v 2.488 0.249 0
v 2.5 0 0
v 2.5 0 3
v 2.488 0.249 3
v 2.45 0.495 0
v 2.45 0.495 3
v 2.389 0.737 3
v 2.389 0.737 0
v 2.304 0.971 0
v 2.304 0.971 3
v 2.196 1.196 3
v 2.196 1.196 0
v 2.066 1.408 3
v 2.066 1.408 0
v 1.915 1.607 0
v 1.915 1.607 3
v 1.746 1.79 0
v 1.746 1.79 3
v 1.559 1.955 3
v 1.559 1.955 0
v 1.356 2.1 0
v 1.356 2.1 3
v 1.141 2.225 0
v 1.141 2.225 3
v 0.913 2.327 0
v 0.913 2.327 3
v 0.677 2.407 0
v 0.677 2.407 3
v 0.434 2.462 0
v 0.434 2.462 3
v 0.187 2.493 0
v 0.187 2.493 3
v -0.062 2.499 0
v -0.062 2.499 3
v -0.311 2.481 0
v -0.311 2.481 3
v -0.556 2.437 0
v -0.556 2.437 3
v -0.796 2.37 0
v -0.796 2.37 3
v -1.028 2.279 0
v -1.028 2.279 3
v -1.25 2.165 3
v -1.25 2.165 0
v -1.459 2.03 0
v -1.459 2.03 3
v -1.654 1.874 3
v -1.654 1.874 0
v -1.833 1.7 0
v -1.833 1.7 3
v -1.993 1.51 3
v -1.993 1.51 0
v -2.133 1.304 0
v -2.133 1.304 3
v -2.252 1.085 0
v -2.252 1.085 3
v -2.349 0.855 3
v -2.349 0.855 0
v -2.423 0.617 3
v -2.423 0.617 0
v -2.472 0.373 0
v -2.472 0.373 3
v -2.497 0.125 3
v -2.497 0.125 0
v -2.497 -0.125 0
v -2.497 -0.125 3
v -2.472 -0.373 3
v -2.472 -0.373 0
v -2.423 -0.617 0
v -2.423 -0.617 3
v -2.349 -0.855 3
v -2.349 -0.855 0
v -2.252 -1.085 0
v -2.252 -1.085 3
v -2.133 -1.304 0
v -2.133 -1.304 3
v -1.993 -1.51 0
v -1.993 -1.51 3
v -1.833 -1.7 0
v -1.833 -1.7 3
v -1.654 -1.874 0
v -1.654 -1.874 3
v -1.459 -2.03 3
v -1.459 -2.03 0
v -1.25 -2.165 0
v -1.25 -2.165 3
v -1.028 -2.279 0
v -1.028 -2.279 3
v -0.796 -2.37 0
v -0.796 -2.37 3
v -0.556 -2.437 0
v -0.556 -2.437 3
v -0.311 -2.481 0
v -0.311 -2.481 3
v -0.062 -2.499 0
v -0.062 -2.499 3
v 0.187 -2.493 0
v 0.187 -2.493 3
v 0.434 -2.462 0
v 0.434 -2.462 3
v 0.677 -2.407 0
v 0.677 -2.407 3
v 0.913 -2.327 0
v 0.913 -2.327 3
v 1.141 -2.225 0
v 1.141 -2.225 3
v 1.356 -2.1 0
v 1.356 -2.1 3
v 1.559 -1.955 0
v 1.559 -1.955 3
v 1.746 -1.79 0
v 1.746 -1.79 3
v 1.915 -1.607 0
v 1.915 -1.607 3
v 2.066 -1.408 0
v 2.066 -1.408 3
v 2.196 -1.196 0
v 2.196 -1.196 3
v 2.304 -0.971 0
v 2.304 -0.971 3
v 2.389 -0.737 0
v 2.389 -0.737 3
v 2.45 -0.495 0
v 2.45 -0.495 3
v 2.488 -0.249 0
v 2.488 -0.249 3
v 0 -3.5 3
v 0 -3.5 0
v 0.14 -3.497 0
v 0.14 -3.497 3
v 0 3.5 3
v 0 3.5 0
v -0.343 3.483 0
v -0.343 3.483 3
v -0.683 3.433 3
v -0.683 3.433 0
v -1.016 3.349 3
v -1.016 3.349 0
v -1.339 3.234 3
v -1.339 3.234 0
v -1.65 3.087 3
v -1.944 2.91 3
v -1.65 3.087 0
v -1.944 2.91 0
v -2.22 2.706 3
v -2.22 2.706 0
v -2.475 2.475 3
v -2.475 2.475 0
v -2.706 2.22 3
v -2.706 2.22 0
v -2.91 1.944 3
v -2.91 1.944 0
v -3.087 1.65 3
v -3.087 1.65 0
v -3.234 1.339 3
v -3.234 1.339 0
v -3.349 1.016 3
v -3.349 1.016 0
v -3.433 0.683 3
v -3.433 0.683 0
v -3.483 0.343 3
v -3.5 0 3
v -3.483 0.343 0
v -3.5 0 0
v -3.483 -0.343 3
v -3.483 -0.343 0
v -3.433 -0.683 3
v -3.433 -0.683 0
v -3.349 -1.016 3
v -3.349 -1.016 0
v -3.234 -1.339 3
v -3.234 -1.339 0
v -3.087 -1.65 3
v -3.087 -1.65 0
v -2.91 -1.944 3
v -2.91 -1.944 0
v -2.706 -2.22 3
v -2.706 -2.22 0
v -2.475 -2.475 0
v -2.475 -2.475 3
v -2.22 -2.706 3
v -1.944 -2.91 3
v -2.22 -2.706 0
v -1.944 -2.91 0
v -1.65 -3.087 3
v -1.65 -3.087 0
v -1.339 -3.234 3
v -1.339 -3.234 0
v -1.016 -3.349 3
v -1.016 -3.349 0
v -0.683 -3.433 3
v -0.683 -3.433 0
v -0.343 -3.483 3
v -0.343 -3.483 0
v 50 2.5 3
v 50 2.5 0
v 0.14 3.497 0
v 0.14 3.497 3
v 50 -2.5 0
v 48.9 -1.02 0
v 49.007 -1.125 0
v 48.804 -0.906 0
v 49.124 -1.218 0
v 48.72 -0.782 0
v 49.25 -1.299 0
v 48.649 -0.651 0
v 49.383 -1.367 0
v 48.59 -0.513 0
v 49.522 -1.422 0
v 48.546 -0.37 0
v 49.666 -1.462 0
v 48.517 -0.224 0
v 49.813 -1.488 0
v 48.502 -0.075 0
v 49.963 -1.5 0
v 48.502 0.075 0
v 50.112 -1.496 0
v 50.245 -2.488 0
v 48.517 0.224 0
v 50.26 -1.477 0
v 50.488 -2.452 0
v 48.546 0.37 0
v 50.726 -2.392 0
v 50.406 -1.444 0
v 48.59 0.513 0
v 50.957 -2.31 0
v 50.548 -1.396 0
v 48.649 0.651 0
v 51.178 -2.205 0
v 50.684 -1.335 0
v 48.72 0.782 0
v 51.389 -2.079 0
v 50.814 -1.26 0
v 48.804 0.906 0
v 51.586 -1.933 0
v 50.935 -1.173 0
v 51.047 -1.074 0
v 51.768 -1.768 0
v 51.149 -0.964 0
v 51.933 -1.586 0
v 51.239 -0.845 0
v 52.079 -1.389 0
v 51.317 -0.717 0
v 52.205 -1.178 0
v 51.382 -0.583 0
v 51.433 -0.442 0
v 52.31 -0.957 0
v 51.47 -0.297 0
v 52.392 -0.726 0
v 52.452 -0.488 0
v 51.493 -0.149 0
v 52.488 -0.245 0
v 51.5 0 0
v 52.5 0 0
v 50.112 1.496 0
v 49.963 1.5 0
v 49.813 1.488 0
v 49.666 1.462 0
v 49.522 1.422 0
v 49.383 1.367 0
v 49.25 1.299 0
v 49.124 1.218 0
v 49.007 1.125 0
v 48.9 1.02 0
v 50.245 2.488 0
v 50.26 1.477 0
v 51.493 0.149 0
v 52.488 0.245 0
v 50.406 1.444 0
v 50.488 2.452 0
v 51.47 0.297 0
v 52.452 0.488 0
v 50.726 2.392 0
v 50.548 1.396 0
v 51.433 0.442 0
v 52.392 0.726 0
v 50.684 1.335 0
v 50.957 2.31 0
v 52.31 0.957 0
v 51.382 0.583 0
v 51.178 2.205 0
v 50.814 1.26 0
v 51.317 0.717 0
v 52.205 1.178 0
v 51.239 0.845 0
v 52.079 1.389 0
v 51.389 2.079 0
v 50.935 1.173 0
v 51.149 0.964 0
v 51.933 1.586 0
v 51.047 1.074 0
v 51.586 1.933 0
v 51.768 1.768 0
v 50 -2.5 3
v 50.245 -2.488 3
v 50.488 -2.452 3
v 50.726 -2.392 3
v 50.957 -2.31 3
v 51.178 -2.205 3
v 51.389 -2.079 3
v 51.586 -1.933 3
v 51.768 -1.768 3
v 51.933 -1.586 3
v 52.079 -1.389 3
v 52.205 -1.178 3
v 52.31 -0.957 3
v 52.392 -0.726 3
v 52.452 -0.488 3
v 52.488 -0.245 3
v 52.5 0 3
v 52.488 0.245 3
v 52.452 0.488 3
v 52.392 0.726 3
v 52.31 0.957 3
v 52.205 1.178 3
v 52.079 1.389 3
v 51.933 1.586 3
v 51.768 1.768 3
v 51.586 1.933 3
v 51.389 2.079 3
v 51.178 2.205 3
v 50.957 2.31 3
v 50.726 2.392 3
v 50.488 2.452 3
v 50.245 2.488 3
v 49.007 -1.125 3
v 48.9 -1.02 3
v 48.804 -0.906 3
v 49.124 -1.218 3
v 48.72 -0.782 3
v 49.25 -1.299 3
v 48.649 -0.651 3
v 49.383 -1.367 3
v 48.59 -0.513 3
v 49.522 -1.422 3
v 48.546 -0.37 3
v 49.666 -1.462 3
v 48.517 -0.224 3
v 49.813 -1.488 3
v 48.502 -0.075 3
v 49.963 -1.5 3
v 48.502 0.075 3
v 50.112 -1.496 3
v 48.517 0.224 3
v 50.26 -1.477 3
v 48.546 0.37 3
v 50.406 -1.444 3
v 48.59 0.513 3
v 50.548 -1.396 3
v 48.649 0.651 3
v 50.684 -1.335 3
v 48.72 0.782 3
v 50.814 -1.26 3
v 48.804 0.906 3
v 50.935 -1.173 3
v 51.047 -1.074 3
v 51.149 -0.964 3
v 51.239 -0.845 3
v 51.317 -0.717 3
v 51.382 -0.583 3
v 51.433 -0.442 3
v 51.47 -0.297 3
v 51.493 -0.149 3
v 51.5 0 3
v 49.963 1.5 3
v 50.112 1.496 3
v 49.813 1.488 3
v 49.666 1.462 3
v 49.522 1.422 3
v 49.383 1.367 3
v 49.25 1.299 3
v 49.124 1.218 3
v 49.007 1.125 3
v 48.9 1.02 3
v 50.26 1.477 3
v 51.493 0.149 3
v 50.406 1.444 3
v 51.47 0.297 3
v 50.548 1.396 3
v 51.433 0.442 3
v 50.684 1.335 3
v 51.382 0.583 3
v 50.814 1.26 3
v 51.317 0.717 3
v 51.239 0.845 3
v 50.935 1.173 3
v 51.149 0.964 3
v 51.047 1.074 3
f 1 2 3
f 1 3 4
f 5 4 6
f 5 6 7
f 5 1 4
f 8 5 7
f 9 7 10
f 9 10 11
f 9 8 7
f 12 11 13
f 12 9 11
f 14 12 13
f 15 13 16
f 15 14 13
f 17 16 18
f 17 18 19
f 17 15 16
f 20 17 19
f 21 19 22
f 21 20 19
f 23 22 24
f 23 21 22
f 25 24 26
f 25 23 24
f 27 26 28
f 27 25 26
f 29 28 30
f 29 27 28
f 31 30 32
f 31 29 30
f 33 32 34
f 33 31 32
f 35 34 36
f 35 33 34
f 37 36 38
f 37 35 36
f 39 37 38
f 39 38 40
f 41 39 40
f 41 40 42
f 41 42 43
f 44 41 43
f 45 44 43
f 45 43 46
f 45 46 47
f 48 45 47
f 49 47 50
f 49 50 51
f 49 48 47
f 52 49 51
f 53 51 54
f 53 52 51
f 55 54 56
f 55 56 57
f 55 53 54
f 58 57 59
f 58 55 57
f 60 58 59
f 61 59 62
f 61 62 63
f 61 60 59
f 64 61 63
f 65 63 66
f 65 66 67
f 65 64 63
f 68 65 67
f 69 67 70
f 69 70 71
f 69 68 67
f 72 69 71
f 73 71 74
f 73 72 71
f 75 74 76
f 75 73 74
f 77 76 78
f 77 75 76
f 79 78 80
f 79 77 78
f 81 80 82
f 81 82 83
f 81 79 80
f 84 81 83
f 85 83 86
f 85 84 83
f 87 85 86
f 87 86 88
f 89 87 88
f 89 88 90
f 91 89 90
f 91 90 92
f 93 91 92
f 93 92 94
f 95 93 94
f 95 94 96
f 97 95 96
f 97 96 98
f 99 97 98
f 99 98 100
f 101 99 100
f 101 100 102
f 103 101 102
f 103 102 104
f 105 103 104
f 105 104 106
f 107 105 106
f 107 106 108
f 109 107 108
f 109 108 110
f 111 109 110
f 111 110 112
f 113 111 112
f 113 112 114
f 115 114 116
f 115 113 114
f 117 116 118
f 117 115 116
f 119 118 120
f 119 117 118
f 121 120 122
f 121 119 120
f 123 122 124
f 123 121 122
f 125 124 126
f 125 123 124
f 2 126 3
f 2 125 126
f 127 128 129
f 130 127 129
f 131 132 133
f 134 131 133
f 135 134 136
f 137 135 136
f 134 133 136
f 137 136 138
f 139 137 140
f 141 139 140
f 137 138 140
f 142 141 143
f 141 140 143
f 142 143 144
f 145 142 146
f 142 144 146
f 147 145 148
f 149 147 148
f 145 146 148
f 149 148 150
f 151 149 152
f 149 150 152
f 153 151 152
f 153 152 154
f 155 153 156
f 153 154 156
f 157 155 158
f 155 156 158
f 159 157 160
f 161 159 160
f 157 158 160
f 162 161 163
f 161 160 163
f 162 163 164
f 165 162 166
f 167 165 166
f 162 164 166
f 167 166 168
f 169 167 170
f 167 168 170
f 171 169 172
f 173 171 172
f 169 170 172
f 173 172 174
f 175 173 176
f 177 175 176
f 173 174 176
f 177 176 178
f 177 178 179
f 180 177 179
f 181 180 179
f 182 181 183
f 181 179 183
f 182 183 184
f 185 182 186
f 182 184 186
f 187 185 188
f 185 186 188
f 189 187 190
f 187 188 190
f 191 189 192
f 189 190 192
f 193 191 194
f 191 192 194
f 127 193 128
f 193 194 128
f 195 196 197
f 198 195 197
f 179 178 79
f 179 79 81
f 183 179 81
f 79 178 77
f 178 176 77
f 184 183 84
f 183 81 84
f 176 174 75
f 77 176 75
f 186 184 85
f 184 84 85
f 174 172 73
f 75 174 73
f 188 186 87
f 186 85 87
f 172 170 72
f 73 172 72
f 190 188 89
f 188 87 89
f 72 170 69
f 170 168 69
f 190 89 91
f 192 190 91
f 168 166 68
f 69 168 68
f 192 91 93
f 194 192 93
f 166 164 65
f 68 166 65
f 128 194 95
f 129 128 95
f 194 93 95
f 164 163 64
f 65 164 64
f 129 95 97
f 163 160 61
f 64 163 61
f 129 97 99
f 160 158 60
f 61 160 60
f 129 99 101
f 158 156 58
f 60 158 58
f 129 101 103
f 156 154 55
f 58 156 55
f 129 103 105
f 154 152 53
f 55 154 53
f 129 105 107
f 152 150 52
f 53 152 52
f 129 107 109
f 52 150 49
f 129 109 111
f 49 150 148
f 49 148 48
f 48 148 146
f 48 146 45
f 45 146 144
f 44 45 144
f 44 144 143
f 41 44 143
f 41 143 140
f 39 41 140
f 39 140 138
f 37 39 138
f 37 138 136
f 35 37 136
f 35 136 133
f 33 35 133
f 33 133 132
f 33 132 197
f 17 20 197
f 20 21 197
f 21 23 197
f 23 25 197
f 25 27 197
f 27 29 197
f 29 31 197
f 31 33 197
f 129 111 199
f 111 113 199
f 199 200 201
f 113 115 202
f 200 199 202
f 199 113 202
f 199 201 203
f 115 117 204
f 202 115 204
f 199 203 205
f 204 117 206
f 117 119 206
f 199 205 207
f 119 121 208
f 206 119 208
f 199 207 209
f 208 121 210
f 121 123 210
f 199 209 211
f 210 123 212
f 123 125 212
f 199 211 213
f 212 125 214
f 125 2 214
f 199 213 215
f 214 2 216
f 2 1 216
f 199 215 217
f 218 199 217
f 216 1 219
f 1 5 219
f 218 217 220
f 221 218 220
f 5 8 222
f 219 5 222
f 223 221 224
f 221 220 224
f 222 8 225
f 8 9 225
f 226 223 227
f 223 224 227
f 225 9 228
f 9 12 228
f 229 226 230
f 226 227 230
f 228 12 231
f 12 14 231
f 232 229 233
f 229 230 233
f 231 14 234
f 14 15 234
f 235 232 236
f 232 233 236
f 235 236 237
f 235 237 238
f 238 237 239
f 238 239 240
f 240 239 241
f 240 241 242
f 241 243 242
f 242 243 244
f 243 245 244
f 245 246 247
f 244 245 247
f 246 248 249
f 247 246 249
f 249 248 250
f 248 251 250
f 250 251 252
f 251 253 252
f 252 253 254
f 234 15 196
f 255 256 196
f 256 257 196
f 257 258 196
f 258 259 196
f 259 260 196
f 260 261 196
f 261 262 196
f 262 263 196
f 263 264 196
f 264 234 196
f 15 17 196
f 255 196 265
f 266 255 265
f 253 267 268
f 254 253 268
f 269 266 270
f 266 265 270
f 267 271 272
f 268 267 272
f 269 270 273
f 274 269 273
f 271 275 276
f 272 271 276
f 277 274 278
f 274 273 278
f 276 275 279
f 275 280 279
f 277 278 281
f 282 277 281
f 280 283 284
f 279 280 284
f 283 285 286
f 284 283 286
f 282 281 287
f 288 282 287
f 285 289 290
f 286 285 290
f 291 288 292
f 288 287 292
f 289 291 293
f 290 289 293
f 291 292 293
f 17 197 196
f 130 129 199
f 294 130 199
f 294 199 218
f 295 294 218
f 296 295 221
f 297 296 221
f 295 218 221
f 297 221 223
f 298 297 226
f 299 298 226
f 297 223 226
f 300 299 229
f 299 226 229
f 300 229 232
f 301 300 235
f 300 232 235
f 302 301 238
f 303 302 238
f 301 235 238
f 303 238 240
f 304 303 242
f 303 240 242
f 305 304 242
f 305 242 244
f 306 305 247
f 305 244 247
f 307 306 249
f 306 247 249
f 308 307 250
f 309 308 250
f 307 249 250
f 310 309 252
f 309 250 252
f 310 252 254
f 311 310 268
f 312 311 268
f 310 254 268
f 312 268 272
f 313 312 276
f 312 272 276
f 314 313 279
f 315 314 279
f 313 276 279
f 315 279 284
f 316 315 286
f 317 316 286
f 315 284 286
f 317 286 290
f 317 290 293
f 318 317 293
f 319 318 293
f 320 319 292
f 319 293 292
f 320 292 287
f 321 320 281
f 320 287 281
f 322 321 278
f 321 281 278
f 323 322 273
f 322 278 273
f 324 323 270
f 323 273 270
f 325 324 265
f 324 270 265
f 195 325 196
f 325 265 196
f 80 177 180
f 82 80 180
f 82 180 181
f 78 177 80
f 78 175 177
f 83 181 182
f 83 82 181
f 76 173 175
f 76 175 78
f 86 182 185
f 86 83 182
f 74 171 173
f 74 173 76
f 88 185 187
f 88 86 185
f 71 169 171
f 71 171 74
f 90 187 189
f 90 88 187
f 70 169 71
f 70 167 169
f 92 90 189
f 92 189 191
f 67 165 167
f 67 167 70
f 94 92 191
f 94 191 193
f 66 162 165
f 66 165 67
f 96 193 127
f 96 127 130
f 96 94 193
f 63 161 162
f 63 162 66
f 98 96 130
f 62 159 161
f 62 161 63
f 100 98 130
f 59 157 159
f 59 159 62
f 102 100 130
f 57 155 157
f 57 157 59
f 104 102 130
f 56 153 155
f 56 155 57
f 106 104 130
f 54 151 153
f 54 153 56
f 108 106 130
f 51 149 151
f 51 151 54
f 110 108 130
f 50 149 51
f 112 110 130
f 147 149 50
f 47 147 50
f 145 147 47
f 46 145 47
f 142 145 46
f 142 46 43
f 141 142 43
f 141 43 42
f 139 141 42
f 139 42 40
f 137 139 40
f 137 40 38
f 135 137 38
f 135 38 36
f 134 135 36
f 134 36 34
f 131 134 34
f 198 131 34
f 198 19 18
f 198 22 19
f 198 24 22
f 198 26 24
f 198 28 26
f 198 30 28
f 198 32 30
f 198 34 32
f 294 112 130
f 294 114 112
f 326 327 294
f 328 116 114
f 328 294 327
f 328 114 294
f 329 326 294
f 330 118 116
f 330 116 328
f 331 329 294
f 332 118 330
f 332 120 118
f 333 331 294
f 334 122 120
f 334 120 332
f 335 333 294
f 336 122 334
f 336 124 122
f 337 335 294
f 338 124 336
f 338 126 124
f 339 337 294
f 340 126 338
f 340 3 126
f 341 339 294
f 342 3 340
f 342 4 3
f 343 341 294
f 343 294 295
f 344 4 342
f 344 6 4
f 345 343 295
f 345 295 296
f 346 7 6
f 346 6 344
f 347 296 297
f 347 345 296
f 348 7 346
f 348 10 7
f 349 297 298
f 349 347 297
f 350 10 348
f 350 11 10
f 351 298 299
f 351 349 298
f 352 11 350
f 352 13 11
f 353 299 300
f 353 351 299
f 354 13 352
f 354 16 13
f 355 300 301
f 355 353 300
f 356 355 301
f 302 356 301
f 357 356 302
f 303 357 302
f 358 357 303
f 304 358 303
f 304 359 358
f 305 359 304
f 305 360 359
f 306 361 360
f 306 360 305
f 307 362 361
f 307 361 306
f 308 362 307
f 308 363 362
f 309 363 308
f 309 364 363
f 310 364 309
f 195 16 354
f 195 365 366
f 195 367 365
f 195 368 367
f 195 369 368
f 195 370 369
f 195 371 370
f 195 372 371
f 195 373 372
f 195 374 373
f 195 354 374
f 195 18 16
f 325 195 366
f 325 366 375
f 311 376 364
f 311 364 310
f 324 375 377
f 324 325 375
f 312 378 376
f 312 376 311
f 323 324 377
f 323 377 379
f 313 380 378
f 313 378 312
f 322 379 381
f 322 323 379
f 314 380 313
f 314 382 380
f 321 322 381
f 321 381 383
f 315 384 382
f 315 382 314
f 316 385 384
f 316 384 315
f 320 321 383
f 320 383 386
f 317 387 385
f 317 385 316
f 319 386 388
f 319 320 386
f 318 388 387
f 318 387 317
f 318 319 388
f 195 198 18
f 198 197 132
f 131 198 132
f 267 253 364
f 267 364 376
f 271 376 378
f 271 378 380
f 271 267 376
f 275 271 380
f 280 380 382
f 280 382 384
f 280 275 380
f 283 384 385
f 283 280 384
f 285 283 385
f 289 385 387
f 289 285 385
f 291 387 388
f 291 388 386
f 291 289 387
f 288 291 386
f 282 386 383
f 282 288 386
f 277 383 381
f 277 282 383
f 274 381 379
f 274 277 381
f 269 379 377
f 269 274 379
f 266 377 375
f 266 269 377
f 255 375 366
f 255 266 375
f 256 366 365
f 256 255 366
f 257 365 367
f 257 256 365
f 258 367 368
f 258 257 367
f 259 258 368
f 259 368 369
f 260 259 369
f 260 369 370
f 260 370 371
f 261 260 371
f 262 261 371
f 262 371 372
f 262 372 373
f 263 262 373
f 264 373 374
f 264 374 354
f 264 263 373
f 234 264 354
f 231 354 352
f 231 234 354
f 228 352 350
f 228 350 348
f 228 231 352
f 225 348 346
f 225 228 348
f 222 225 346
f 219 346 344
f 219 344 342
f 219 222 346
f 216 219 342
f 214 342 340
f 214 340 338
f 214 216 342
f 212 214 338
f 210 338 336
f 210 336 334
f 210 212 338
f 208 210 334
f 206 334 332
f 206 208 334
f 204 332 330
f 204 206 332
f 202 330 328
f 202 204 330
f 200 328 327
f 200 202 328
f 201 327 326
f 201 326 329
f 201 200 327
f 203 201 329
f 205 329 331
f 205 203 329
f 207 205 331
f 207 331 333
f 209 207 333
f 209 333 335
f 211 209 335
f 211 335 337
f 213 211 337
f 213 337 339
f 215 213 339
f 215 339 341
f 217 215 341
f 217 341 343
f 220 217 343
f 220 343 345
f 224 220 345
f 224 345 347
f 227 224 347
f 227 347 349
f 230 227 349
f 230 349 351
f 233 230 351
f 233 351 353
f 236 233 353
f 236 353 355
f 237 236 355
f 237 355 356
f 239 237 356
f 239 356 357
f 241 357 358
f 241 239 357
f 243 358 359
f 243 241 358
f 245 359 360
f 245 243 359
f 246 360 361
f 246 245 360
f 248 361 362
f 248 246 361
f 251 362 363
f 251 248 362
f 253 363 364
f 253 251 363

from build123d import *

# Parameters (mm, degrees)
SKETCH1_R           = 2.5
SKETCH1_R_2         = 1.5
BOSS_EXTRUDE1_DEPTH = 3


with BuildPart() as part:
    # Sketch1 → Boss-Extrude1 (new body)
    with BuildSketch(Plane.XY):
        with BuildLine():
            Line((0.139944022, 3.49720112), (0, 3.5))
            ThreePointArc((0, 3.5), (-3.5, 0), (0, -3.5))
            Line((0, -3.5), (0.139944022, -3.49720112))
            Line((0.139944022, -3.49720112), (50, -2.5))
            ThreePointArc((50, -2.5), (52.5, 0), (50, 2.5))
            Line((50, 2.5), (0.139944022, 3.49720112))
        make_face()
        Circle(SKETCH1_R, mode=Mode.SUBTRACT)
        with Locations((50, 0)):
            Circle(SKETCH1_R_2, mode=Mode.SUBTRACT)
    extrude(amount=BOSS_EXTRUDE1_DEPTH)


solid = part.part
